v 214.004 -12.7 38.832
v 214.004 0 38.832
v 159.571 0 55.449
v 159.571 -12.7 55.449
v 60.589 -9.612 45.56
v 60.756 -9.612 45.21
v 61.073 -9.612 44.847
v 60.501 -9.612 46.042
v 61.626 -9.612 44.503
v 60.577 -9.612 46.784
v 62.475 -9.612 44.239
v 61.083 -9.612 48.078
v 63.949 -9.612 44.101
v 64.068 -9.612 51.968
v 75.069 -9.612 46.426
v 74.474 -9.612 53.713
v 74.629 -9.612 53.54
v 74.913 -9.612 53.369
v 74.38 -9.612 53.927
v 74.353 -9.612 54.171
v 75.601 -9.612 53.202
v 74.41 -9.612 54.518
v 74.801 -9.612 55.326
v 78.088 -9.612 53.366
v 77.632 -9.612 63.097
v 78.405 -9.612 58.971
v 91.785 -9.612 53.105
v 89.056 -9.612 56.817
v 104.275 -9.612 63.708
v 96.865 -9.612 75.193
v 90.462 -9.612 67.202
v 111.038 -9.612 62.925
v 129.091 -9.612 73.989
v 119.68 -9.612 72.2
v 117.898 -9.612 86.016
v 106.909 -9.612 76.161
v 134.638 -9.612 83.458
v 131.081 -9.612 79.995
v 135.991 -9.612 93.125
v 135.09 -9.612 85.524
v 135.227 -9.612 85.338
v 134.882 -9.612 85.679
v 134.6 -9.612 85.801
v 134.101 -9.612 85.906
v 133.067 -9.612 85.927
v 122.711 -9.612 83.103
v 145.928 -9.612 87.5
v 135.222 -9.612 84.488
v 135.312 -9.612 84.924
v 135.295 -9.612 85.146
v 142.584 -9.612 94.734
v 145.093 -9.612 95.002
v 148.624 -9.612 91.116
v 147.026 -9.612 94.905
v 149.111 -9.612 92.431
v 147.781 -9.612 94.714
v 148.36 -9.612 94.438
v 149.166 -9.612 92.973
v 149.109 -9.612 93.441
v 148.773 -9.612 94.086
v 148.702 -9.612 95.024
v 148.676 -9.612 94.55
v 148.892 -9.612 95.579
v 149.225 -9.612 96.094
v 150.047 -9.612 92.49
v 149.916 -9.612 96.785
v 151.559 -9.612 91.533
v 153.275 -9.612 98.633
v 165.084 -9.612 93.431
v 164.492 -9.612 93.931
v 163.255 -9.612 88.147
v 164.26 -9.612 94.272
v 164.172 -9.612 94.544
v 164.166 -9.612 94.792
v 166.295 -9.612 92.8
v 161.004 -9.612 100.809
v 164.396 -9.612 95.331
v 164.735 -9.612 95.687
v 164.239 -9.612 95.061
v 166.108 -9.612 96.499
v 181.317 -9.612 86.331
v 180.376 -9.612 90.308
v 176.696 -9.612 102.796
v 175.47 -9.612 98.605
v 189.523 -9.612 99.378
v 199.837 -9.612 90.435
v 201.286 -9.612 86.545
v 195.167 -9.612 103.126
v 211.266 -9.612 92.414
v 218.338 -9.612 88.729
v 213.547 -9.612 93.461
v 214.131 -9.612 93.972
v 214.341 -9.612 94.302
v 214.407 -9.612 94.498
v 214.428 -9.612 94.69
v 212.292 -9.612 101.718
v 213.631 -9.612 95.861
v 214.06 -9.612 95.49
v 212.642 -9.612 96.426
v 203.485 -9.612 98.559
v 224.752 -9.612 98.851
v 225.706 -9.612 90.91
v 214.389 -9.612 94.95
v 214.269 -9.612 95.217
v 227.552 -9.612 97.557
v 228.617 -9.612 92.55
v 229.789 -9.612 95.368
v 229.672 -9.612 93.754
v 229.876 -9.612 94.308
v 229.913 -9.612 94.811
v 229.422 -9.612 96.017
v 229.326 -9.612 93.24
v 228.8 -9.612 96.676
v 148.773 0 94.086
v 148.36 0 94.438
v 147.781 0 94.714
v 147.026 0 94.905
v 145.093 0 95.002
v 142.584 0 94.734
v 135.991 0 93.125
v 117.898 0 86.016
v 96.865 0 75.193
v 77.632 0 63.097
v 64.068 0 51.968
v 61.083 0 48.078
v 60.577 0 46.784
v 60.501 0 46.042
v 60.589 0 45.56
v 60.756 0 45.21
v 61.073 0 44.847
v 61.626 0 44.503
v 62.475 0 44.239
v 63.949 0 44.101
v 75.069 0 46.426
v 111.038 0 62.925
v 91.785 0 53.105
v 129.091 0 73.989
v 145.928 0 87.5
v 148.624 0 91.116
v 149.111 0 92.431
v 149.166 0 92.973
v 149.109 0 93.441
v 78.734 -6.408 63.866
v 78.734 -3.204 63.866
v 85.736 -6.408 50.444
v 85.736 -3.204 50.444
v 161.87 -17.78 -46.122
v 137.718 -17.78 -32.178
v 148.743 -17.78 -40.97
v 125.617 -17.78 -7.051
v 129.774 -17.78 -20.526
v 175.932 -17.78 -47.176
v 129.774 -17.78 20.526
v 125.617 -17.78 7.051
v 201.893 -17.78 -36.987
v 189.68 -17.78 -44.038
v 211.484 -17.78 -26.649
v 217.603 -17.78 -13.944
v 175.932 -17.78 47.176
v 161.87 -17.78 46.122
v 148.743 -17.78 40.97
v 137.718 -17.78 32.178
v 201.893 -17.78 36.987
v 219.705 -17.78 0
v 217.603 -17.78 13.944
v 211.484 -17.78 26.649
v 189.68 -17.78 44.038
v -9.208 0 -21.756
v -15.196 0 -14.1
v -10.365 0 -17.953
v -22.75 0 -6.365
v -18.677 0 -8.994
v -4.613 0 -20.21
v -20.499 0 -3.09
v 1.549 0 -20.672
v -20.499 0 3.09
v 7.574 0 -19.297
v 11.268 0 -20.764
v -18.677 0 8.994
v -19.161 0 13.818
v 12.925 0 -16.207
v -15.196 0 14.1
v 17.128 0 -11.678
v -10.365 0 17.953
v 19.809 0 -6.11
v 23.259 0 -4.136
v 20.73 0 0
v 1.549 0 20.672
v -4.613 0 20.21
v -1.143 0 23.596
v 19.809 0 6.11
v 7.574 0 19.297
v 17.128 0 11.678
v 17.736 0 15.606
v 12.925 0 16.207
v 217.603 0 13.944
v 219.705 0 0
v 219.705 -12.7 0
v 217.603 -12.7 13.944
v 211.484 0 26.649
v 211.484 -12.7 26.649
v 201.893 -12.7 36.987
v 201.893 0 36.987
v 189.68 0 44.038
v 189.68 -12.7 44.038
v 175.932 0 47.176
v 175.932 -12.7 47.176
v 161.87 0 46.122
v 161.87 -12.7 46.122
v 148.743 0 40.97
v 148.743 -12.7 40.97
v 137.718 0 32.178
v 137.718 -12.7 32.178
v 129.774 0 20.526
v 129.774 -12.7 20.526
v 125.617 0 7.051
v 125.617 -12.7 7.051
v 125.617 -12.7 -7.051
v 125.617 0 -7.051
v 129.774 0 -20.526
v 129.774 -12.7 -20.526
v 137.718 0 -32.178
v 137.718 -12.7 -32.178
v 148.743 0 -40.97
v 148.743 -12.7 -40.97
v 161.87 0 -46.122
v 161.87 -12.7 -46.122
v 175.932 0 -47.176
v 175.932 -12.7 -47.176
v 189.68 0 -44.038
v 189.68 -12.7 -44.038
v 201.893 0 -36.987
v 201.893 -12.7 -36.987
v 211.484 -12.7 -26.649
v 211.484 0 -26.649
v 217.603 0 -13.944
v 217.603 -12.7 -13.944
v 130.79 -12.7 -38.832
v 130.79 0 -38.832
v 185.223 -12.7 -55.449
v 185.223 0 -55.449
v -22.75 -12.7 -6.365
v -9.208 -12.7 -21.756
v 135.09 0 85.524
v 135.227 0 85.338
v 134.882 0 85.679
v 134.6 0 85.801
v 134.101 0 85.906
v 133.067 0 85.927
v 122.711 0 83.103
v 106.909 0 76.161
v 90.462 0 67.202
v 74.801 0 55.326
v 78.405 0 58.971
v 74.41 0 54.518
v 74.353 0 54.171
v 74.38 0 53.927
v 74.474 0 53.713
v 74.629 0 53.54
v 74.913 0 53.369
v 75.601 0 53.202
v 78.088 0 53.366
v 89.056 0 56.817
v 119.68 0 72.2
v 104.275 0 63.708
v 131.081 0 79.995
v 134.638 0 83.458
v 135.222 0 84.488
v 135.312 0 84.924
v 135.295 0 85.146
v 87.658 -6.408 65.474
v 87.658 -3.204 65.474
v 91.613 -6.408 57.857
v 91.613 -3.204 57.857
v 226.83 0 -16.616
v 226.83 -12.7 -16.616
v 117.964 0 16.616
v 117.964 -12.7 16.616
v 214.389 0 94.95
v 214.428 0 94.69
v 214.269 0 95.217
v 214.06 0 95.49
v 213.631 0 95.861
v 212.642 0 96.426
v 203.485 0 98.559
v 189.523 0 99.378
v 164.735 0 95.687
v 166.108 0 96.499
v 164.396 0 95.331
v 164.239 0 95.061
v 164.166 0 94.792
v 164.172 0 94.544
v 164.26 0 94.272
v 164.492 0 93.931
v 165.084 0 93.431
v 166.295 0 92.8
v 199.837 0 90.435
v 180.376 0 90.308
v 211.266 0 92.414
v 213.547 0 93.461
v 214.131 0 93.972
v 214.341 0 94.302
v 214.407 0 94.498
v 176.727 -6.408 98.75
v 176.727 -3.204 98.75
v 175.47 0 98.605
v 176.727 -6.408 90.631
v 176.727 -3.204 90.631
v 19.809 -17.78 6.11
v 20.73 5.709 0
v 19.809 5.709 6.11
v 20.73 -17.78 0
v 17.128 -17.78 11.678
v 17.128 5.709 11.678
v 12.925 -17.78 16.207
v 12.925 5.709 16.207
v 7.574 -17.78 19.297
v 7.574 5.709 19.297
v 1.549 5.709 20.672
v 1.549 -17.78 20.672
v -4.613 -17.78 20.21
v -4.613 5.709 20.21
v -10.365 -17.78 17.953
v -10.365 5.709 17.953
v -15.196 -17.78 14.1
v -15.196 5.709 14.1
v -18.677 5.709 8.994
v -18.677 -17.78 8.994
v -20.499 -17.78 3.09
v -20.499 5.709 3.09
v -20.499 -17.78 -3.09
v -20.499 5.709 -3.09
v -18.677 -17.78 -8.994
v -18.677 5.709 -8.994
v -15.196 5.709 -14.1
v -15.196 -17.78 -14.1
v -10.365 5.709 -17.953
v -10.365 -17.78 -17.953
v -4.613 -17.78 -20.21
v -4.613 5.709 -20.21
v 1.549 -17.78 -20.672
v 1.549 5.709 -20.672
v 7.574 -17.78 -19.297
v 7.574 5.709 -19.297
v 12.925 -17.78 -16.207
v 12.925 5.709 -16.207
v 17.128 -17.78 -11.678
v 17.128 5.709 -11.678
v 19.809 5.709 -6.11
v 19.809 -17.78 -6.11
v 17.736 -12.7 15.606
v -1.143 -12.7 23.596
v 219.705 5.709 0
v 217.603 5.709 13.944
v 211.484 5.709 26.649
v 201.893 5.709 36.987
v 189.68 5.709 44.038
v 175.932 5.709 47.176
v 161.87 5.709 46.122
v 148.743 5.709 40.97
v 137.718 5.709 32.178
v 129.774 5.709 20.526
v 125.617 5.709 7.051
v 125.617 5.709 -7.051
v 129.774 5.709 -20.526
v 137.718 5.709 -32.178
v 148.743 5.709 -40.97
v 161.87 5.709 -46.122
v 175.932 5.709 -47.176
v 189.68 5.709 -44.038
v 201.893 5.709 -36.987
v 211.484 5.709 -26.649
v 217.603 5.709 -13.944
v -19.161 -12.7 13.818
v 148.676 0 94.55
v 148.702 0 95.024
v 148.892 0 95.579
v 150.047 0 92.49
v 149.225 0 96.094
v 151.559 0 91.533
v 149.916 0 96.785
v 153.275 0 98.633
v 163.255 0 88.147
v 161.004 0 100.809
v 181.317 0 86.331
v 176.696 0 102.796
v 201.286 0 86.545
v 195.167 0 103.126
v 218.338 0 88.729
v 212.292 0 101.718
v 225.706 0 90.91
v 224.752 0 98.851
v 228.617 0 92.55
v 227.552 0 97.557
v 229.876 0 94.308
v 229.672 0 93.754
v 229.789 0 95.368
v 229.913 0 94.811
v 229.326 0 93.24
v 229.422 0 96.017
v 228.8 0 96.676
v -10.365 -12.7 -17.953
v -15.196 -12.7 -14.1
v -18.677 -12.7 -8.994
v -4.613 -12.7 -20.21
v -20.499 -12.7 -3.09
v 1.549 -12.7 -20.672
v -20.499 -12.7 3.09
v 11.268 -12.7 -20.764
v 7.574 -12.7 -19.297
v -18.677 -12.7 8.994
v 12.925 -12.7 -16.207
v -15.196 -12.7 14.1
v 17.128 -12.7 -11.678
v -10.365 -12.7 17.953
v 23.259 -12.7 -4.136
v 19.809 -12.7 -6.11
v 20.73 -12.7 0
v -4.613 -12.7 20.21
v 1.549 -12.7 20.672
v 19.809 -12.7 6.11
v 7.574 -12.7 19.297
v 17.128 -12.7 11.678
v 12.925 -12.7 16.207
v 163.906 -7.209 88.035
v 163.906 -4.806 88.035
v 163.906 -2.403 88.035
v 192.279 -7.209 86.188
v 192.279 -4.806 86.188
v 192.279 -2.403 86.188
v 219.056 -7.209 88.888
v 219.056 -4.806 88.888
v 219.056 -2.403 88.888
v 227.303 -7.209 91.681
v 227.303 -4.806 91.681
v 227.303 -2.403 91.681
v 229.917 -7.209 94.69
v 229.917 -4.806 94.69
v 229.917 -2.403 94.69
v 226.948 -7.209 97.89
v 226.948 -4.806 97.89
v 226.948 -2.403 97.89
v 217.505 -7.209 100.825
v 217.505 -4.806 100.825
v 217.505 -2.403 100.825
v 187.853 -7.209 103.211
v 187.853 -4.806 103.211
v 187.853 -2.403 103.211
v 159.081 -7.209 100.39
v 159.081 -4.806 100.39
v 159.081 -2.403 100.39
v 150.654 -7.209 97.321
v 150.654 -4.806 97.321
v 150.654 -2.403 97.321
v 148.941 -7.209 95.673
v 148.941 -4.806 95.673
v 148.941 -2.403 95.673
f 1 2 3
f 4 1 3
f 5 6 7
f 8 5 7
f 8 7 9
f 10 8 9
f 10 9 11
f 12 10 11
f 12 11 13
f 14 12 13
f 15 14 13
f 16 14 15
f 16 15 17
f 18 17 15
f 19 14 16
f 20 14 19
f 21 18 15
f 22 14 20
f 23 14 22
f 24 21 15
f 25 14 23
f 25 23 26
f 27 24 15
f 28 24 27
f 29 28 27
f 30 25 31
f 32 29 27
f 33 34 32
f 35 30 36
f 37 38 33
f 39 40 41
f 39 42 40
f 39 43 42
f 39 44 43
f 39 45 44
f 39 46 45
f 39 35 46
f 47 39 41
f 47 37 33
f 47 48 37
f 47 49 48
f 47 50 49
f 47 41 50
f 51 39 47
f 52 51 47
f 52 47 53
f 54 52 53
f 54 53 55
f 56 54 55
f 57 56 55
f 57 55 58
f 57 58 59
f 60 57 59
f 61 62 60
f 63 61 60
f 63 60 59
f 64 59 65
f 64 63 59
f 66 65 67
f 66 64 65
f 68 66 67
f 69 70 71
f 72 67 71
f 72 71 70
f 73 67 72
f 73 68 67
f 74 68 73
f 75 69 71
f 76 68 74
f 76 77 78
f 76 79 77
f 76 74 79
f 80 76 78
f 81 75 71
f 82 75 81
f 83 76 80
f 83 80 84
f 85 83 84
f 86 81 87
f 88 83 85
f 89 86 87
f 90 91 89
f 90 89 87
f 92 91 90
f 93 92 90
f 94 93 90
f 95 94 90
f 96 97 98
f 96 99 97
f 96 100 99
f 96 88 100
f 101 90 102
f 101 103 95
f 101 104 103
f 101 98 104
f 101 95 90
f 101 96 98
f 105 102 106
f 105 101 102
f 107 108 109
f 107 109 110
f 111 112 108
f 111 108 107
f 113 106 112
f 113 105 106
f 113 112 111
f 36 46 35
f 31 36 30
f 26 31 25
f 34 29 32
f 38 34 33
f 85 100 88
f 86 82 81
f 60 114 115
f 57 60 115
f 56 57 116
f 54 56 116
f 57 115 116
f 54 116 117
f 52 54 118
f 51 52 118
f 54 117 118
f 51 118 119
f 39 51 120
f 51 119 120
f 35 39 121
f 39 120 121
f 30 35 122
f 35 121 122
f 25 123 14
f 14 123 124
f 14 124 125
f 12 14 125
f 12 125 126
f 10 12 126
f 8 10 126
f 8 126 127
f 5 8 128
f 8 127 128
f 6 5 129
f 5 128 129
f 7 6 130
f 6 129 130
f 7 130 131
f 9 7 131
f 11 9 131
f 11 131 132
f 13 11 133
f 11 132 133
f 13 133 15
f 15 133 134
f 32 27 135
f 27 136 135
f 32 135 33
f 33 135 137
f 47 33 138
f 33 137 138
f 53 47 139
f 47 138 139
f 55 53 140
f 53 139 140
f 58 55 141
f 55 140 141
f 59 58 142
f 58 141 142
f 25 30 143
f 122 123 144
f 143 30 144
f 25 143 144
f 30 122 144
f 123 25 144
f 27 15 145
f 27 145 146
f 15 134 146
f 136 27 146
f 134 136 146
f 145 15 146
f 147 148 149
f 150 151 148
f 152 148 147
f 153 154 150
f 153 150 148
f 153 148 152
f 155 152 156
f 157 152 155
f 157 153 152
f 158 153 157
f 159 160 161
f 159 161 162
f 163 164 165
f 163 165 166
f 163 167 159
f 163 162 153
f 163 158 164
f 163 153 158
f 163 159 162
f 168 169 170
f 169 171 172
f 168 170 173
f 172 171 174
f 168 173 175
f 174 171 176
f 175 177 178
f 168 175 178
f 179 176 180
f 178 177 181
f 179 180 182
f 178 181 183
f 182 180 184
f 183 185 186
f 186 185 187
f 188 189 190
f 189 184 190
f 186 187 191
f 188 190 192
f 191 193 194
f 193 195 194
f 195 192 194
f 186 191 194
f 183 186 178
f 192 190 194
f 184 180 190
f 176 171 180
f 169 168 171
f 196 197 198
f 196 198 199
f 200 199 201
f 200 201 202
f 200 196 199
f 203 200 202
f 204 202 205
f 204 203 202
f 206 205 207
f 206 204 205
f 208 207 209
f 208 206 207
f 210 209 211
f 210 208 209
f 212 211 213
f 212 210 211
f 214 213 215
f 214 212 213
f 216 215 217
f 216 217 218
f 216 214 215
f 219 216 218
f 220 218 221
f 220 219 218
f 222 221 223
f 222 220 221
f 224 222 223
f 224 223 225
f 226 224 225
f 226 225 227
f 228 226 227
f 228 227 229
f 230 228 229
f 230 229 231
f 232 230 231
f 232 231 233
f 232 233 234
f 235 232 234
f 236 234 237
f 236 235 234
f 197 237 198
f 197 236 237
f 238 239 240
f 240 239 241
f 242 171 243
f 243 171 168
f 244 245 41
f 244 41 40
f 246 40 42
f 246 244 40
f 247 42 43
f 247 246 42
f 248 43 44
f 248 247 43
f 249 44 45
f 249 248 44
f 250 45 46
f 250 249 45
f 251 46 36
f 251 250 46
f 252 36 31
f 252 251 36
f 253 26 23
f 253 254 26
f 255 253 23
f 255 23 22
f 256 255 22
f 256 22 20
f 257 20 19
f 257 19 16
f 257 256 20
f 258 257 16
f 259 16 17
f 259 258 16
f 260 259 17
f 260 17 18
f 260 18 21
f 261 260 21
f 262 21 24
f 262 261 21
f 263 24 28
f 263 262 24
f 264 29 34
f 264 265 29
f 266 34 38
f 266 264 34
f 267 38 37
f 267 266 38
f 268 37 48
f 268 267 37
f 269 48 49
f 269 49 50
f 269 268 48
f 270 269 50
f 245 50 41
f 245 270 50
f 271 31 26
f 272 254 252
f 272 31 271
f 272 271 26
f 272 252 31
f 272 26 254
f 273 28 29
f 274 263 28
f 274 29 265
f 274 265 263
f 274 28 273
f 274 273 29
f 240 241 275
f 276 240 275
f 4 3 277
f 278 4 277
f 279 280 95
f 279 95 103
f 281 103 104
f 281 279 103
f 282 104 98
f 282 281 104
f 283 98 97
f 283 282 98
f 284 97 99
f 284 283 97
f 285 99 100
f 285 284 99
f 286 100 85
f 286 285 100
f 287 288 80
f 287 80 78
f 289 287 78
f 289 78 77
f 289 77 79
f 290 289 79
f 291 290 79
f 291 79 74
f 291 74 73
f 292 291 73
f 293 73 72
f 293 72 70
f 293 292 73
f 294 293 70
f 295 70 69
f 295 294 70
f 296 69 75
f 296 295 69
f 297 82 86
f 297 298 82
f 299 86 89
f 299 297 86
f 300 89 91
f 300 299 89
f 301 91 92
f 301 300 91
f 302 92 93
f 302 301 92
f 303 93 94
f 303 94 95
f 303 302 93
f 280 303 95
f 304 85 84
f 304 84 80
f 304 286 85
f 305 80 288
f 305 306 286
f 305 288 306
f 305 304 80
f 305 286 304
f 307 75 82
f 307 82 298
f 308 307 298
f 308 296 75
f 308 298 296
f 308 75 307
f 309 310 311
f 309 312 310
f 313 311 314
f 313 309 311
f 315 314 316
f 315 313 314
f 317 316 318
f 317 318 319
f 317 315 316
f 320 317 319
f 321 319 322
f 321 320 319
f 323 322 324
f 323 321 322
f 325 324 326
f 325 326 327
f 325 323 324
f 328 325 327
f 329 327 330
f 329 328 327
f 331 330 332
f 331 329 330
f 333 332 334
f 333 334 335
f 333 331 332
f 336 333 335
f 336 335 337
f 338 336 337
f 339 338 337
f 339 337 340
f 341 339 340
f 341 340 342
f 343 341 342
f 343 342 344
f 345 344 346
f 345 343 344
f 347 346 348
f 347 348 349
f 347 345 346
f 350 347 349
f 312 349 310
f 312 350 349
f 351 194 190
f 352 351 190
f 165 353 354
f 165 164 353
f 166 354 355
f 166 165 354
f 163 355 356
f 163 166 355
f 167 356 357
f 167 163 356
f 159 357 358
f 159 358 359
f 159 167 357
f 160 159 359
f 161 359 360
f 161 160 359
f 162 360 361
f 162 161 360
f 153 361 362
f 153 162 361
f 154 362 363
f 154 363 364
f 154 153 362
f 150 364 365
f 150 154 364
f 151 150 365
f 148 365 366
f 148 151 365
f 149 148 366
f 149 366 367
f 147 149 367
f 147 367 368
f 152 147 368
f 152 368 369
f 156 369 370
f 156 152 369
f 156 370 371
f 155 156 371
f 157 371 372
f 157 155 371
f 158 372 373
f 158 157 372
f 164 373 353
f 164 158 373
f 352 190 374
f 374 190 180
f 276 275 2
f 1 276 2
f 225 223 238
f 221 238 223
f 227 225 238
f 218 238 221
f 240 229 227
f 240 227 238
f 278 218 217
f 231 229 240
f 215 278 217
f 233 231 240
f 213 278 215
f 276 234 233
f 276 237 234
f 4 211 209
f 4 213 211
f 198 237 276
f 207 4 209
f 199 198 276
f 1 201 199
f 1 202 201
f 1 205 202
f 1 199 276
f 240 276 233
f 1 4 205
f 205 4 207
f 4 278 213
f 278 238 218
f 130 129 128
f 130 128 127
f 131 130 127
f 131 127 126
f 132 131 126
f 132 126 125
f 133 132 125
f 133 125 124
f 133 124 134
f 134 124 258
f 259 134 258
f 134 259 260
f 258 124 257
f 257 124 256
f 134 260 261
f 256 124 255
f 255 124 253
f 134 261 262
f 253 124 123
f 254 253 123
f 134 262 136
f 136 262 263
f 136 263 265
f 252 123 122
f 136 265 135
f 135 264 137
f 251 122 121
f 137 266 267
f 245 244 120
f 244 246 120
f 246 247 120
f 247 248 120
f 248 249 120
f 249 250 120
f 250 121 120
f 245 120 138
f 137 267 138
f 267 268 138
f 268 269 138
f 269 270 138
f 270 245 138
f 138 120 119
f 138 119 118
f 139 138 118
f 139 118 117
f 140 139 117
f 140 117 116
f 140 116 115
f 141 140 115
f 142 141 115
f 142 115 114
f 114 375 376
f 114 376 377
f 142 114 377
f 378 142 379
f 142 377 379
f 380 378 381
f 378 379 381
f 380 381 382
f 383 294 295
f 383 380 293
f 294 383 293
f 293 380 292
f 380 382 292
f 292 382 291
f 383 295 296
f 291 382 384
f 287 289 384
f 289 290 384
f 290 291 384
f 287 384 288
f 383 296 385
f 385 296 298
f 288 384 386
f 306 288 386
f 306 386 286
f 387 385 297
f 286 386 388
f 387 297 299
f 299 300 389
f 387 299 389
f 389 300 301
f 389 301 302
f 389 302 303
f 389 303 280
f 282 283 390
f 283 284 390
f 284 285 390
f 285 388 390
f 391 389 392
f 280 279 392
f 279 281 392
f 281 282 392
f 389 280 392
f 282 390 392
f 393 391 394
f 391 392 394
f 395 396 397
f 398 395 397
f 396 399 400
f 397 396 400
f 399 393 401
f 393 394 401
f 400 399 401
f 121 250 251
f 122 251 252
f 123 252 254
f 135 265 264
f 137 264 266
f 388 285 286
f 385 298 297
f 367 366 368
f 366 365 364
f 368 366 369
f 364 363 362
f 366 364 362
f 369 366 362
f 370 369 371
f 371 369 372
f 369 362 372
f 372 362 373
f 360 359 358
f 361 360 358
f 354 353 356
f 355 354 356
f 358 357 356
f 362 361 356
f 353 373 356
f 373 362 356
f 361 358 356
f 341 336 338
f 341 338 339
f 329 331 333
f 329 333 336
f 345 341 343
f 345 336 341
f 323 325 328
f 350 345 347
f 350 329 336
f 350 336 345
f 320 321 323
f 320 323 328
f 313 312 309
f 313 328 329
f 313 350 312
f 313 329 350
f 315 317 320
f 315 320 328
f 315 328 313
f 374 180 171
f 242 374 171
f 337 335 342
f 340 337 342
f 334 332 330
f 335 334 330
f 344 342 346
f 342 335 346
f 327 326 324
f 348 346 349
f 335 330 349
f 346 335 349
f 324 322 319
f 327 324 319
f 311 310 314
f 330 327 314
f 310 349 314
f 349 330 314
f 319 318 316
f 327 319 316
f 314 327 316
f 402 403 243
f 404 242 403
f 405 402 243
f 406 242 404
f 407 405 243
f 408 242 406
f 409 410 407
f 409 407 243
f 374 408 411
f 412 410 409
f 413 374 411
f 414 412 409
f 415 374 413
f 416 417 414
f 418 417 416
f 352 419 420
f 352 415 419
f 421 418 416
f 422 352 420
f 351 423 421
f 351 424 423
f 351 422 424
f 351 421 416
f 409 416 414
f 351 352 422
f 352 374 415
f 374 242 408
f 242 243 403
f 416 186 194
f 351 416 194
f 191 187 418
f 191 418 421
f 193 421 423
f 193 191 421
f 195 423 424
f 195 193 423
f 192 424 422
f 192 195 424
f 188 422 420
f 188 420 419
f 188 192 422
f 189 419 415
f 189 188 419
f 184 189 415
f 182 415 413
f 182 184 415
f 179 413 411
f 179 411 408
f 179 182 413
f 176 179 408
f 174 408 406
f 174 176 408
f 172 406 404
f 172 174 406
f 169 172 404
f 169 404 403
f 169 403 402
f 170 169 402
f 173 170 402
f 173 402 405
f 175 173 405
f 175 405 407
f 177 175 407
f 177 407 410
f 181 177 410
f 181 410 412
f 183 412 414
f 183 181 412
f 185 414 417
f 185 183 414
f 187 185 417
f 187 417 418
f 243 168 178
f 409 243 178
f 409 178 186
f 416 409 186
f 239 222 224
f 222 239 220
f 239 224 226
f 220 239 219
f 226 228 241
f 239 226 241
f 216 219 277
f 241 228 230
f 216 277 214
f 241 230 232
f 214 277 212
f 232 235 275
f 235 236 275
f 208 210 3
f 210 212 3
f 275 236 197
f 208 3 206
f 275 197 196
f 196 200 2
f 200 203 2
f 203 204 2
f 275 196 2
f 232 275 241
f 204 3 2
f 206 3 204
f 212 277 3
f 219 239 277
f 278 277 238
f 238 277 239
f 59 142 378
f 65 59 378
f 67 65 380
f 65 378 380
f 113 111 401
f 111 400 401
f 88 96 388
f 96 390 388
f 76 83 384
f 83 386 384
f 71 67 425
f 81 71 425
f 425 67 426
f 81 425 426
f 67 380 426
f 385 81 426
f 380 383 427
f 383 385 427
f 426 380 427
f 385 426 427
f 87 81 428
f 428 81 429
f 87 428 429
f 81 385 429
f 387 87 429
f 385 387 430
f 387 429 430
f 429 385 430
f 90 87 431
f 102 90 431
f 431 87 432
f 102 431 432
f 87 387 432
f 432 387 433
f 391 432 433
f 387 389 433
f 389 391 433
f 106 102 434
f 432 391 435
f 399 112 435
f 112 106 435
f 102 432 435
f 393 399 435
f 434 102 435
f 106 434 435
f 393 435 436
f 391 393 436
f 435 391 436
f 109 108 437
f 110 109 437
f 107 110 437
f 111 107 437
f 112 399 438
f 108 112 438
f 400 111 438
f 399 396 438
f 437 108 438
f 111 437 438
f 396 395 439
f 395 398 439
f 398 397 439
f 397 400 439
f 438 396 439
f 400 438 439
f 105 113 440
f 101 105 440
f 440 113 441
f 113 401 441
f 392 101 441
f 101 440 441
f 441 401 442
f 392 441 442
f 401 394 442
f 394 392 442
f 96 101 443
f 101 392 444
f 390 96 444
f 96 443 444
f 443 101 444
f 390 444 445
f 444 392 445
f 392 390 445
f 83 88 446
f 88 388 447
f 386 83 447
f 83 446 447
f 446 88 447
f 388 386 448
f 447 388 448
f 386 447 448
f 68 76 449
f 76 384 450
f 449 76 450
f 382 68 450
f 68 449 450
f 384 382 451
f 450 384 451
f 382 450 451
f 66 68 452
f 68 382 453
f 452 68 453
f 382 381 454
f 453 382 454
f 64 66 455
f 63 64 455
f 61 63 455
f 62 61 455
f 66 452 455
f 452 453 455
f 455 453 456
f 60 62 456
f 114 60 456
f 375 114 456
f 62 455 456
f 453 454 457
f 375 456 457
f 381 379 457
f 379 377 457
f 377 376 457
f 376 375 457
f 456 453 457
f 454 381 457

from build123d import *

# Parameters (mm, degrees)
F0_R          = 20.730113571
F1_DEPTH      = 12.7
F0_R_2        = 47.3078923064
F2_DEPTH      = 17.78
F2_DEPTH_BACK = 5.7093314826
F4_DEPTH      = 9.6123982221


with BuildPart() as f1:
    # F0 (on Front) → F1 (new body)
    with BuildSketch(Plane.XZ):
        Polygon((11.2682855074, -20.7635520264), (23.2592597604, -4.1359625757), (17.7355370114, 15.6060910528), (-1.1434068462, 23.5964398122), (-19.1613420274, 13.8181881134), (-22.7503958417, -6.3654410744), (-9.2079375638, -21.7557633019), align=None)
        Circle(F0_R, mode=Mode.SUBTRACT)
    extrude(amount=F1_DEPTH)


with BuildPart() as f1b:
    # F0 (on Front) → F1, piece 2 (new body)
    with BuildSketch(Plane.XZ):
        Polygon((185.2231494194, -55.4486300133), (226.8299162388, -16.6164040565), (214.0036054844, 38.8322259568), (159.5705279106, 55.4486300133), (117.9637610912, 16.6164040565), (130.7900718456, -38.8322259568), align=None)
        with Locations((172.396838665, 0)):
            Circle(F0_R_2, mode=Mode.SUBTRACT)
    extrude(amount=F1_DEPTH)


with BuildPart() as f2:
    # F0 (on Front) → F2 (new body, two sides)
    with BuildSketch(Plane.XZ) as f2_sk:
        Circle(F0_R)
    extrude(amount=F2_DEPTH)
    extrude(f2_sk.sketch, amount=-F2_DEPTH_BACK)


with BuildPart() as f2b:
    # F0 (on Front) → F2, piece 2 (new body, two sides)
    with BuildSketch(Plane.XZ) as f2_2_sk:
        with Locations((172.396838665, 0)):
            Circle(F0_R_2)
    extrude(amount=F2_DEPTH)
    extrude(f2_2_sk.sketch, amount=-F2_DEPTH_BACK)


with BuildPart() as f4:
    # F3 (on Front) → F4 (new body)
    with BuildSketch(Plane.XZ):
        with BuildLine():
            add(Edge.make_bspline(
                [(149.1094218068, 93.4406164812), (154.6413458405, 85.6056569344), (192.2793466359, 86.1877237137), (229.9173474312, 86.7697904929), (229.9173474312, 94.6903005242)],
                knots=[3.2887023648, 3.2887023648, 3.2887023648, 4.785943836, 4.785943836, 6.2831853072, 6.2831853072, 6.2831853072], degree=2, weights=[1, 0.7326283327, 1, 0.7326283327, 1]))
            add(Edge.make_bspline(
                [(229.9173474312, 94.6903005242), (229.9173474312, 103.5239405817), (187.8528657988, 103.2105636581), (145.7883841663, 102.8971867345), (148.7728928762, 94.0857810212)],
                knots=[0, 0, 0, 1.606279173, 1.606279173, 3.2125583461, 3.2125583461, 3.2125583461], degree=2, weights=[1, 0.6944510778, 1, 0.6944510778, 1]))
            add(Edge.make_bspline(
                [(148.962944746, 93.8134789467), (148.8833945922, 93.9582027434), (148.7728928762, 94.0857810212)],
                knots=[0, 0, 0, 0.0374890809, 0.0374890809, 0.0374890809], degree=2, weights=[1, 0.9998243262, 1]))
            add(Edge.make_bspline(
                [(149.1094218068, 93.4406164812), (149.0586850223, 93.6393008261), (148.962944746, 93.8134789467)],
                knots=[6.2380687825, 6.2380687825, 6.2380687825, 6.2831853072, 6.2831853072, 6.2831853072], degree=2, weights=[1, 0.9997455732, 1]))
        make_face()
        with BuildLine():
            add(Edge.make_bspline(
                [(214.4278287888, 94.6903005242), (214.4278287888, 102.8091515427), (176.727078855, 98.7497260335), (139.0263289213, 94.6903005242), (176.727078855, 90.630875015), (214.4278287888, 86.5714495058), (214.4278287888, 94.6903005242)],
                knots=[0, 0, 0, 2.0943951024, 2.0943951024, 4.1887902048, 4.1887902048, 6.2831853072, 6.2831853072, 6.2831853072], degree=2, weights=[1, 0.5, 1, 0.5, 1, 0.5, 1]))
        make_face(mode=Mode.SUBTRACT)
        with BuildLine():
            add(Edge.make_bspline(
                [(148.962944746, 93.8134789467), (148.8833945922, 93.9582027434), (148.7728928762, 94.0857810212)],
                knots=[0, 0, 0, 0.0374890809, 0.0374890809, 0.0374890809], degree=2, weights=[1, 0.9998243262, 1]))
            add(Edge.make_bspline(
                [(148.7728928762, 94.0857810212), (148.8826102275, 93.761853638), (149.1094218068, 93.4406164812)],
                knots=[3.2125583461, 3.2125583461, 3.2125583461, 3.2887023648, 3.2887023648, 3.2887023648], degree=2, weights=[1, 0.9992753486, 1]))
            add(Edge.make_bspline(
                [(149.1094218068, 93.4406164812), (149.0586850223, 93.6393008261), (148.962944746, 93.8134789467)],
                knots=[6.2380687825, 6.2380687825, 6.2380687825, 6.2831853072, 6.2831853072, 6.2831853072], degree=2, weights=[1, 0.9997455732, 1]))
        make_face()
        with BuildLine():
            add(Edge.make_bspline(
                [(148.7728928762, 94.0857810212), (148.8826102275, 93.761853638), (149.1094218068, 93.4406164812)],
                knots=[3.2125583461, 3.2125583461, 3.2125583461, 3.2887023648, 3.2887023648, 3.2887023648], degree=2, weights=[1, 0.9992753486, 1]))
            add(Edge.make_bspline(
                [(148.7728928762, 94.0857810212), (138.8804733248, 105.5069416545), (78.7344910031, 63.8662788682), (18.5885086814, 22.2256160818), (85.7359691391, 50.4436426255), (152.8834295967, 78.6616691692), (149.1094218068, 93.4406164812)],
                knots=[0.0374890809, 0.0374890809, 0.0374890809, 2.1043489814, 2.1043489814, 4.171208882, 4.171208882, 6.2380687825, 6.2380687825, 6.2380687825], degree=2, weights=[1, 0.5118753295, 1, 0.5118753295, 1, 0.5118753295, 1]))
        make_face()
        with BuildLine():
            add(Edge.make_bspline(
                [(135.2269947529, 85.3381156921), (131.2721693717, 92.9548139368), (87.6579743724, 65.4738915461), (44.0437793732, 37.9929691553), (91.6127997536, 57.8571933014), (139.1818201341, 77.7214174475), (135.2269947529, 85.3381156921)],
                knots=[0, 0, 0, 2.0943951024, 2.0943951024, 4.1887902048, 4.1887902048, 6.2831853072, 6.2831853072, 6.2831853072], degree=2, weights=[1, 0.5, 1, 0.5, 1, 0.5, 1]))
        make_face(mode=Mode.SUBTRACT)
    extrude(amount=F4_DEPTH)


solid = Compound([f1.part, f1b.part, f2.part, f2b.part, f4.part])
